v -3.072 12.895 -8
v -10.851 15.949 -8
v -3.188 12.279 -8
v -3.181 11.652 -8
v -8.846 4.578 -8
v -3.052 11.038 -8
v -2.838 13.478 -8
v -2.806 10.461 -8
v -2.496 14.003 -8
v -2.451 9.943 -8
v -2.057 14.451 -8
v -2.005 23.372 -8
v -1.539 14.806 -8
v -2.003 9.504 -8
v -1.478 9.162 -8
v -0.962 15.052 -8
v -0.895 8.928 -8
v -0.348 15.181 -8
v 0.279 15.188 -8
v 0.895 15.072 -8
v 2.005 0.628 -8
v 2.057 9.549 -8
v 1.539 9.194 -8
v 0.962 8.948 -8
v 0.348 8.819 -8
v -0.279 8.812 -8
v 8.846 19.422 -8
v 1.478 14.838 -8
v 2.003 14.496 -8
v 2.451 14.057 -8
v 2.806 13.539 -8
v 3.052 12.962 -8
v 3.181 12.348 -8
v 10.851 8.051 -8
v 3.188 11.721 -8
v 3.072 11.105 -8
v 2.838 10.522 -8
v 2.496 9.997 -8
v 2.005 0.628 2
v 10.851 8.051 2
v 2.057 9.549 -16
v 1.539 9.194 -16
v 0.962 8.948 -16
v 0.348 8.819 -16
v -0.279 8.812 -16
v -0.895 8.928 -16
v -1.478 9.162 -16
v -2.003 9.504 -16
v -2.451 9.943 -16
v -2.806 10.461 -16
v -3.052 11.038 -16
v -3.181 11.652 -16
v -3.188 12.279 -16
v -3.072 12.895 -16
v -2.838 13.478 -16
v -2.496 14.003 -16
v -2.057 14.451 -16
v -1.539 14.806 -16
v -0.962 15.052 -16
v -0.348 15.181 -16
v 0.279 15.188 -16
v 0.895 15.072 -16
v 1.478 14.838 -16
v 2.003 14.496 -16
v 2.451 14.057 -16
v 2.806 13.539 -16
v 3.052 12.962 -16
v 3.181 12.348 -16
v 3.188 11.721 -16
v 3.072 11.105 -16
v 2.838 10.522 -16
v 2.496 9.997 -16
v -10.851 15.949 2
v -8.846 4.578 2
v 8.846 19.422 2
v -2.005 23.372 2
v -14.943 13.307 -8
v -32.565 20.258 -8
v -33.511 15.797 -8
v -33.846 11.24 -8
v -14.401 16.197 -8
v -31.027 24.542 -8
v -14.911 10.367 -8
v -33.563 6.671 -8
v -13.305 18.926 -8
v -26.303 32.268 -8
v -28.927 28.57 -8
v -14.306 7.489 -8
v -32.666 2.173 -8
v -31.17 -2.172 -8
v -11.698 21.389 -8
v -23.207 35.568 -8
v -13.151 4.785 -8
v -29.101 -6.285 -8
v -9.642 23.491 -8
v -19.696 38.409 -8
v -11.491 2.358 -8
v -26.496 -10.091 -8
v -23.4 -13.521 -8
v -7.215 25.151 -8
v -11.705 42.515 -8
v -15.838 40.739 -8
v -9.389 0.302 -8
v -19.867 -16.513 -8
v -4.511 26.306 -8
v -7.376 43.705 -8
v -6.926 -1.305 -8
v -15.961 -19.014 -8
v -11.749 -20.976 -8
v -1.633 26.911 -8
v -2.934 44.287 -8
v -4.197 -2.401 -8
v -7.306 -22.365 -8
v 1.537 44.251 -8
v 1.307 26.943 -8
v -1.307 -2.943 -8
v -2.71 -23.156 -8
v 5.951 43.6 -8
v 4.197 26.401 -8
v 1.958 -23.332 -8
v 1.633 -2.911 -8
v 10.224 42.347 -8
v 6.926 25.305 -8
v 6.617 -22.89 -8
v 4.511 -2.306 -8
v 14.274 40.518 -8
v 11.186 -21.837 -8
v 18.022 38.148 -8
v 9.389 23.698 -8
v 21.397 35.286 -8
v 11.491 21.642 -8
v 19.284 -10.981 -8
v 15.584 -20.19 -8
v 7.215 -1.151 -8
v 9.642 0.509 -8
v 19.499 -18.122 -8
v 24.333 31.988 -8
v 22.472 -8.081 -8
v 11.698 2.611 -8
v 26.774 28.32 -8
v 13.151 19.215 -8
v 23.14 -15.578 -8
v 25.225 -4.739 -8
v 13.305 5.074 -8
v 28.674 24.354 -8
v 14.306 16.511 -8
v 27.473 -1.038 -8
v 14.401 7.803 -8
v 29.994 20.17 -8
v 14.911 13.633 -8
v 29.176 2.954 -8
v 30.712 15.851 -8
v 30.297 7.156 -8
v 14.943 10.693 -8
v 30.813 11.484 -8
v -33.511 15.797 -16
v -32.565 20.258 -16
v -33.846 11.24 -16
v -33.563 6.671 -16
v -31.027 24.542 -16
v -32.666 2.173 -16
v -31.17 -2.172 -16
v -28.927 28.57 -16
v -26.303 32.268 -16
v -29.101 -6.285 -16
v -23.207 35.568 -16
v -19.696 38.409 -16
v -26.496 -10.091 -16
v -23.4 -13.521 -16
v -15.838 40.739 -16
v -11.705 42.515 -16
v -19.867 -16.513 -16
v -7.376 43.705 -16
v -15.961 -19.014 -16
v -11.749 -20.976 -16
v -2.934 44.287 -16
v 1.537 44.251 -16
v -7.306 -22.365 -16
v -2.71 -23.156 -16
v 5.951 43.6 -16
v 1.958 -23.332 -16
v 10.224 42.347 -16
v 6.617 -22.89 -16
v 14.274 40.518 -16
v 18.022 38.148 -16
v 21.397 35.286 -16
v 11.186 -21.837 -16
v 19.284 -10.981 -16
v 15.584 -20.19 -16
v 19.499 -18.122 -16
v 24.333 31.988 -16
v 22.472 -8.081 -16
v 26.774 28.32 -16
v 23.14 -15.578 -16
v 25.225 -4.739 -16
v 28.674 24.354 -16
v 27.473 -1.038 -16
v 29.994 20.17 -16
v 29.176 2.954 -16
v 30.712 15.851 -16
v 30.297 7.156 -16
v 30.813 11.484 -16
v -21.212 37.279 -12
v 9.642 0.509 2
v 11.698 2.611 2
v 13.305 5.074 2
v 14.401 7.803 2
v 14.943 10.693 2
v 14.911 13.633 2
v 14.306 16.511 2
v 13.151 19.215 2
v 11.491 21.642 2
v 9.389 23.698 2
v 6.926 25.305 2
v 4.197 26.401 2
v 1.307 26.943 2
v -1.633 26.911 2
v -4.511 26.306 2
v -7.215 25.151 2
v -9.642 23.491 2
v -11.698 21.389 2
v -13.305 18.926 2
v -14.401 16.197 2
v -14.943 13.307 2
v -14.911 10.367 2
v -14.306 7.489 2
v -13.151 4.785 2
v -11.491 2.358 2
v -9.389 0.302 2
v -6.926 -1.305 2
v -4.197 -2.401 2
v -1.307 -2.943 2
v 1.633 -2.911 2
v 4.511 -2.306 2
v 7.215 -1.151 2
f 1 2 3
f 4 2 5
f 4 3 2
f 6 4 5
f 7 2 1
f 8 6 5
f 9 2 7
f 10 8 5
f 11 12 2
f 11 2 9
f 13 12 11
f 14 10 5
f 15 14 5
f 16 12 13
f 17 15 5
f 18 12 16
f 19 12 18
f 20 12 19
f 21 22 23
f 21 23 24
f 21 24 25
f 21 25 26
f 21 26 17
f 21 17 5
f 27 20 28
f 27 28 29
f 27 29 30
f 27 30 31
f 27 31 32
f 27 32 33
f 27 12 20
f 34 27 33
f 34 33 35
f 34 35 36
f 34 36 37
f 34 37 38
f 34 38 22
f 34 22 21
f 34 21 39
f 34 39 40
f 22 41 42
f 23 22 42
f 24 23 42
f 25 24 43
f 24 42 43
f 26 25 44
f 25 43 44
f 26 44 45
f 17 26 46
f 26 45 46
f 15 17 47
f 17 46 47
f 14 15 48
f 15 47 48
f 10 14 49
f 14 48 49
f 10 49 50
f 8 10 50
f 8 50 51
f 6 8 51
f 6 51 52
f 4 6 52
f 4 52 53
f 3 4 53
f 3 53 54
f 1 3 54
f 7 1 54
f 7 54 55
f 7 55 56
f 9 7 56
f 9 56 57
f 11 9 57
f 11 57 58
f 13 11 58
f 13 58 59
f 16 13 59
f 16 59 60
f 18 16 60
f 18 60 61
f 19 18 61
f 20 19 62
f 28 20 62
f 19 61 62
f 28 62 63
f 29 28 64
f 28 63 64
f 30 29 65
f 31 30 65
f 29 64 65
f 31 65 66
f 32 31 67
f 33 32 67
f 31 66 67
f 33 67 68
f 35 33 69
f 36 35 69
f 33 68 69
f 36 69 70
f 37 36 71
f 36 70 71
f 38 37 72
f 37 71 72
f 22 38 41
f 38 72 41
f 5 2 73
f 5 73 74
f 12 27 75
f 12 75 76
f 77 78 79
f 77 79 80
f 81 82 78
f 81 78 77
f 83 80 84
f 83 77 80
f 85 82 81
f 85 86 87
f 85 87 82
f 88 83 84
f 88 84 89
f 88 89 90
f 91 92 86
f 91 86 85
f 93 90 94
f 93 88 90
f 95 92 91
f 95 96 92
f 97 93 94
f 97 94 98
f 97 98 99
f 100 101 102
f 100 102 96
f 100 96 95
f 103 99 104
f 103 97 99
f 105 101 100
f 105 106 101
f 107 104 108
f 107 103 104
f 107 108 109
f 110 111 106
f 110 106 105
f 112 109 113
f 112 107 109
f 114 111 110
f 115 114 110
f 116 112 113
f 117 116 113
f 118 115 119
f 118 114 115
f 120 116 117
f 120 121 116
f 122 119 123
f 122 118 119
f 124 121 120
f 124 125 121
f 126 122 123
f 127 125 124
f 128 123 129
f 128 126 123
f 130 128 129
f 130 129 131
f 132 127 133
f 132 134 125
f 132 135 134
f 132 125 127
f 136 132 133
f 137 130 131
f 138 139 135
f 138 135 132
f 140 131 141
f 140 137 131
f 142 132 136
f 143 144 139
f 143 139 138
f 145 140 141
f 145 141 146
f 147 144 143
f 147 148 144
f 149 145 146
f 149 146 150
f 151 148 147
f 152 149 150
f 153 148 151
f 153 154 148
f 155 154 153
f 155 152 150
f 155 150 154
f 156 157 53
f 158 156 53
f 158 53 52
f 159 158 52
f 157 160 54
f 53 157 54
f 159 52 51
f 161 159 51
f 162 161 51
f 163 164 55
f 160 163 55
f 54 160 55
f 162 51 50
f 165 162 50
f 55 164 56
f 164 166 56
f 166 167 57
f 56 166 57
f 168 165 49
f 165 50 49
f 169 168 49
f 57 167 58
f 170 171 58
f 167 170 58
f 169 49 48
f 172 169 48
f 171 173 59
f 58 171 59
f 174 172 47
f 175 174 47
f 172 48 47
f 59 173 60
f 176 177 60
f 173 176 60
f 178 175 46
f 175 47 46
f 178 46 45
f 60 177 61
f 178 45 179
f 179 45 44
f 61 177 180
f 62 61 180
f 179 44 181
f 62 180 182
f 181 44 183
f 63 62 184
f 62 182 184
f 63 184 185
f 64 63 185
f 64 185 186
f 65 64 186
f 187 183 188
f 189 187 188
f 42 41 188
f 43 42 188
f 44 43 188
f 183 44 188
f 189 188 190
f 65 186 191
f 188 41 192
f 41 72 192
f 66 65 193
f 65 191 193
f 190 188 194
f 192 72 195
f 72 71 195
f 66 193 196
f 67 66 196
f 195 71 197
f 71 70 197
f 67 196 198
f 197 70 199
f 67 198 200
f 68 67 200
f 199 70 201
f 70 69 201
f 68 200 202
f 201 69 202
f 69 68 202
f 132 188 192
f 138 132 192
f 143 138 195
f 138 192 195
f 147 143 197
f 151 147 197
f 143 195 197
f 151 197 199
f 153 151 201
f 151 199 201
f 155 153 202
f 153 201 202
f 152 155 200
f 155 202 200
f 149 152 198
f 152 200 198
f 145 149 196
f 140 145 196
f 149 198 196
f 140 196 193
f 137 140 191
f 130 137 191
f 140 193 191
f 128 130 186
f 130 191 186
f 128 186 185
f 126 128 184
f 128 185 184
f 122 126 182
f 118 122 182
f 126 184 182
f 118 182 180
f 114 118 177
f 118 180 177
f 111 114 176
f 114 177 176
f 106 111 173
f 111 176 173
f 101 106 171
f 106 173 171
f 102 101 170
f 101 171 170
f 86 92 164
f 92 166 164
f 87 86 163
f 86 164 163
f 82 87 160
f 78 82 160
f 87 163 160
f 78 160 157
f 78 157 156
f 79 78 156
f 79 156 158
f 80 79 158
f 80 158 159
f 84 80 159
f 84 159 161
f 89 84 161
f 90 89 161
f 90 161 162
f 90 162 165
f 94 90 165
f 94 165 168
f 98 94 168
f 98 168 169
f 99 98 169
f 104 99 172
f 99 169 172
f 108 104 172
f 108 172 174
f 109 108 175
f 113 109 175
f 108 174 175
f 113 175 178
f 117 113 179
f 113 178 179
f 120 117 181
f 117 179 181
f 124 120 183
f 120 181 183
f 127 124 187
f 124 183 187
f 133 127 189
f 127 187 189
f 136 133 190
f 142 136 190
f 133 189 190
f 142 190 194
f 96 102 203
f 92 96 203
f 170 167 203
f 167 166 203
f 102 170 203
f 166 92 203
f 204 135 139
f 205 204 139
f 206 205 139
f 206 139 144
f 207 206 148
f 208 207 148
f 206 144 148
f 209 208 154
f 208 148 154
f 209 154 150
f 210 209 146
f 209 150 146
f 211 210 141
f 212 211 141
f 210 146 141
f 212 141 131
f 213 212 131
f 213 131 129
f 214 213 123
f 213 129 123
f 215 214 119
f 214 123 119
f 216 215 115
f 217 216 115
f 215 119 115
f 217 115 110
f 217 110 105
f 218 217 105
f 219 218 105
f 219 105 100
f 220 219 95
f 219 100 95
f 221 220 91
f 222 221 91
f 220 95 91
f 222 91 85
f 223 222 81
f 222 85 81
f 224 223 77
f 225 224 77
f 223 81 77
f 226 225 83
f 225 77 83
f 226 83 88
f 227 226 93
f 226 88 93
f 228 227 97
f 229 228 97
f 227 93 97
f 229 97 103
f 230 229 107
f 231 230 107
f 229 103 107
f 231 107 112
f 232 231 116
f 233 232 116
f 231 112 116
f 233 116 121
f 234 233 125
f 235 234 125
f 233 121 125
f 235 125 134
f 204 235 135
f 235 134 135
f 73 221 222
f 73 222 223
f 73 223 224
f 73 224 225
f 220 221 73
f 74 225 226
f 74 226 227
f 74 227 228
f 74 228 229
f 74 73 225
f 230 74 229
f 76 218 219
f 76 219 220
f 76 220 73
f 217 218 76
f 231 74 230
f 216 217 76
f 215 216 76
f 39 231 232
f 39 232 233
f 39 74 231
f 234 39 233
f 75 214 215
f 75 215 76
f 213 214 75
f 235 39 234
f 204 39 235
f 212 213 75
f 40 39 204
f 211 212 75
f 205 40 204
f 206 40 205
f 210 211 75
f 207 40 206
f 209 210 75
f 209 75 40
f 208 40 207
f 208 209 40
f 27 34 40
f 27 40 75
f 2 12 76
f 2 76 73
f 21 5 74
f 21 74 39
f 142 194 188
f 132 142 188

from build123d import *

# Parameters (mm, degrees)
PAD_DEPTH               = 8
SKETCH019_R             = 15
PAD010_DEPTH            = 10
SKETCH020_R             = 3.2
POCKET_DEPTH            = 18.001
BODY005_PLACEMENT_ANGLE = 310


with BuildPart() as part:
    # Sketch018 → Pad (new body)
    with BuildSketch(Plane.XY):
        with BuildLine():
            add(Edge.make_bspline(
                [(30, 0), (30.272727, 8.56798), (27.853744, 17.307319), (22.653329, 25.278439), (14.950718, 31.494746), (5.420543, 35.088391), (-4.927781, 35.491962), (-14.908573, 32.583746), (-23.388897, 26.726717), (-29.493664, 18.678196), (-32.727273, 9.424778), (-33.272727, -9.424778), (-30.584573, -19.020915), (-24.845816, -27.754875), (-16.372589, -34.546103), (-5.913321, -38.44936), (5.420559, -38.852932), (16.330444, -35.635102), (25.581384, -29.203153), (32.224493, -20.391792), (35.727273, -10.281576), (36, 0)],
                knots=[0, 0, 0, 0, 0, 0, 0, 0, 0, 0, 0, 0, 3.181133, 3.181133, 3.181133, 3.181133, 3.181133, 3.181133, 3.181133, 3.181133, 3.181133, 3.181133, 6.362265, 6.362265, 6.362265, 6.362265, 6.362265, 6.362265, 6.362265, 6.362265, 6.362265, 6.362265, 6.362265, 6.362265], degree=11))
            Line((36, 0), (30, 0))
        make_face()
    extrude(amount=PAD_DEPTH)

    # Sketch019 (on Face4 of Pad) → Pad010 (join)
    with BuildSketch(Plane.XY.offset(8)):
        Circle(SKETCH019_R)
        Polygon((0, -11.547005), (10, -5.773503), (10, 5.773503), (0, 11.547005), (-10, 5.773503), (-10, -5.773503), align=None, mode=Mode.SUBTRACT)
    extrude(amount=PAD010_DEPTH)

    # Sketch020 (on Face3 of Pad010) → Pocket (cut, through all)
    with BuildSketch(Plane(origin=(0, 0, 0), x_dir=(1, 0, 0), z_dir=(0, 0, -1))):
        Circle(SKETCH020_R)
    extrude(amount=-POCKET_DEPTH, mode=Mode.SUBTRACT)


with BuildPart() as part_1:
    # Body005 placement: moved
    add(part.part.moved(Location((0, 12, -16))).rotate(Axis((0, 12, -16), (0, 0, 1)), BODY005_PLACEMENT_ANGLE))


solid = part_1.part
